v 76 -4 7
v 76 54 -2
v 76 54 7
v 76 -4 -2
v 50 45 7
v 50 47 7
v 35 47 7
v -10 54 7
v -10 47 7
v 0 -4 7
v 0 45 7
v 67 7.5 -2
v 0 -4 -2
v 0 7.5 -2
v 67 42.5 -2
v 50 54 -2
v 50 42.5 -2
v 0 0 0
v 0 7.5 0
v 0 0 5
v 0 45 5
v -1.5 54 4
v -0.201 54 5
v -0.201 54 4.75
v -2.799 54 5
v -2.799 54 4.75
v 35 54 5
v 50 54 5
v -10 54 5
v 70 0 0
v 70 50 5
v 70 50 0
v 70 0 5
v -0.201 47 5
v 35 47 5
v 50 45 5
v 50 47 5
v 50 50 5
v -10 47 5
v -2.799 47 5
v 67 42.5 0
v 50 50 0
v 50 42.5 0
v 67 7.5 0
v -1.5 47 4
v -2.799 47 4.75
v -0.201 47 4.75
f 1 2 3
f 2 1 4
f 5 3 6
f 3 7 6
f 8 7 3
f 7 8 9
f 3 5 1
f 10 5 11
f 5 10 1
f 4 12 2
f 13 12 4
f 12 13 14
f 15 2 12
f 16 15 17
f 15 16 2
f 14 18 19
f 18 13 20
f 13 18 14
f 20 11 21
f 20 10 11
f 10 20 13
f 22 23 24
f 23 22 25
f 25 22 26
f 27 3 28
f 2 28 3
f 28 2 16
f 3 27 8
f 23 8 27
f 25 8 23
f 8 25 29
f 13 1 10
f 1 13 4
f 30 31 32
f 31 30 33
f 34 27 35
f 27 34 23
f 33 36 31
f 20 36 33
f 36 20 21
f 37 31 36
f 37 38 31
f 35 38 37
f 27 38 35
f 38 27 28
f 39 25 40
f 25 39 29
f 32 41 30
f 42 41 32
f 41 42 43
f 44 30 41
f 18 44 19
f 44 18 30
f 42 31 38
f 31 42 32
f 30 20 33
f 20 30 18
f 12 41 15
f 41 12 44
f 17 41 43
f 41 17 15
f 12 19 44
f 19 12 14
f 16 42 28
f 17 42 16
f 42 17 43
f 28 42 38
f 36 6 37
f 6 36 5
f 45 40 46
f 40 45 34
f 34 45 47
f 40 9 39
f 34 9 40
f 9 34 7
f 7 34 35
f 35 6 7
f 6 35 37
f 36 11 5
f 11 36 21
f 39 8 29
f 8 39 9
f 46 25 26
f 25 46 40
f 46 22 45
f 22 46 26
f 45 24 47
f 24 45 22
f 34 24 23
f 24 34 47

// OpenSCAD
difference(){
union(){
 translate([0,-4,-2]) cube([76,58,9]);    
 
}
cube([70,50,5]);
translate([0,7.5,-5])    cube([67,50-15,10]);
translate([-20,25,-15])cube([70,50,20]);
translate([35,25,-20])rotate([0,0,115])cube([70,50,20]);
translate([0,45,0])cube([50,2,20]);

}
translate([-10,47,5])cube([45,7,2]);
translate([-1.5,47+7,5.5])rotate([90,-30,0])cylinder($fn=6, d=3,h=7);
